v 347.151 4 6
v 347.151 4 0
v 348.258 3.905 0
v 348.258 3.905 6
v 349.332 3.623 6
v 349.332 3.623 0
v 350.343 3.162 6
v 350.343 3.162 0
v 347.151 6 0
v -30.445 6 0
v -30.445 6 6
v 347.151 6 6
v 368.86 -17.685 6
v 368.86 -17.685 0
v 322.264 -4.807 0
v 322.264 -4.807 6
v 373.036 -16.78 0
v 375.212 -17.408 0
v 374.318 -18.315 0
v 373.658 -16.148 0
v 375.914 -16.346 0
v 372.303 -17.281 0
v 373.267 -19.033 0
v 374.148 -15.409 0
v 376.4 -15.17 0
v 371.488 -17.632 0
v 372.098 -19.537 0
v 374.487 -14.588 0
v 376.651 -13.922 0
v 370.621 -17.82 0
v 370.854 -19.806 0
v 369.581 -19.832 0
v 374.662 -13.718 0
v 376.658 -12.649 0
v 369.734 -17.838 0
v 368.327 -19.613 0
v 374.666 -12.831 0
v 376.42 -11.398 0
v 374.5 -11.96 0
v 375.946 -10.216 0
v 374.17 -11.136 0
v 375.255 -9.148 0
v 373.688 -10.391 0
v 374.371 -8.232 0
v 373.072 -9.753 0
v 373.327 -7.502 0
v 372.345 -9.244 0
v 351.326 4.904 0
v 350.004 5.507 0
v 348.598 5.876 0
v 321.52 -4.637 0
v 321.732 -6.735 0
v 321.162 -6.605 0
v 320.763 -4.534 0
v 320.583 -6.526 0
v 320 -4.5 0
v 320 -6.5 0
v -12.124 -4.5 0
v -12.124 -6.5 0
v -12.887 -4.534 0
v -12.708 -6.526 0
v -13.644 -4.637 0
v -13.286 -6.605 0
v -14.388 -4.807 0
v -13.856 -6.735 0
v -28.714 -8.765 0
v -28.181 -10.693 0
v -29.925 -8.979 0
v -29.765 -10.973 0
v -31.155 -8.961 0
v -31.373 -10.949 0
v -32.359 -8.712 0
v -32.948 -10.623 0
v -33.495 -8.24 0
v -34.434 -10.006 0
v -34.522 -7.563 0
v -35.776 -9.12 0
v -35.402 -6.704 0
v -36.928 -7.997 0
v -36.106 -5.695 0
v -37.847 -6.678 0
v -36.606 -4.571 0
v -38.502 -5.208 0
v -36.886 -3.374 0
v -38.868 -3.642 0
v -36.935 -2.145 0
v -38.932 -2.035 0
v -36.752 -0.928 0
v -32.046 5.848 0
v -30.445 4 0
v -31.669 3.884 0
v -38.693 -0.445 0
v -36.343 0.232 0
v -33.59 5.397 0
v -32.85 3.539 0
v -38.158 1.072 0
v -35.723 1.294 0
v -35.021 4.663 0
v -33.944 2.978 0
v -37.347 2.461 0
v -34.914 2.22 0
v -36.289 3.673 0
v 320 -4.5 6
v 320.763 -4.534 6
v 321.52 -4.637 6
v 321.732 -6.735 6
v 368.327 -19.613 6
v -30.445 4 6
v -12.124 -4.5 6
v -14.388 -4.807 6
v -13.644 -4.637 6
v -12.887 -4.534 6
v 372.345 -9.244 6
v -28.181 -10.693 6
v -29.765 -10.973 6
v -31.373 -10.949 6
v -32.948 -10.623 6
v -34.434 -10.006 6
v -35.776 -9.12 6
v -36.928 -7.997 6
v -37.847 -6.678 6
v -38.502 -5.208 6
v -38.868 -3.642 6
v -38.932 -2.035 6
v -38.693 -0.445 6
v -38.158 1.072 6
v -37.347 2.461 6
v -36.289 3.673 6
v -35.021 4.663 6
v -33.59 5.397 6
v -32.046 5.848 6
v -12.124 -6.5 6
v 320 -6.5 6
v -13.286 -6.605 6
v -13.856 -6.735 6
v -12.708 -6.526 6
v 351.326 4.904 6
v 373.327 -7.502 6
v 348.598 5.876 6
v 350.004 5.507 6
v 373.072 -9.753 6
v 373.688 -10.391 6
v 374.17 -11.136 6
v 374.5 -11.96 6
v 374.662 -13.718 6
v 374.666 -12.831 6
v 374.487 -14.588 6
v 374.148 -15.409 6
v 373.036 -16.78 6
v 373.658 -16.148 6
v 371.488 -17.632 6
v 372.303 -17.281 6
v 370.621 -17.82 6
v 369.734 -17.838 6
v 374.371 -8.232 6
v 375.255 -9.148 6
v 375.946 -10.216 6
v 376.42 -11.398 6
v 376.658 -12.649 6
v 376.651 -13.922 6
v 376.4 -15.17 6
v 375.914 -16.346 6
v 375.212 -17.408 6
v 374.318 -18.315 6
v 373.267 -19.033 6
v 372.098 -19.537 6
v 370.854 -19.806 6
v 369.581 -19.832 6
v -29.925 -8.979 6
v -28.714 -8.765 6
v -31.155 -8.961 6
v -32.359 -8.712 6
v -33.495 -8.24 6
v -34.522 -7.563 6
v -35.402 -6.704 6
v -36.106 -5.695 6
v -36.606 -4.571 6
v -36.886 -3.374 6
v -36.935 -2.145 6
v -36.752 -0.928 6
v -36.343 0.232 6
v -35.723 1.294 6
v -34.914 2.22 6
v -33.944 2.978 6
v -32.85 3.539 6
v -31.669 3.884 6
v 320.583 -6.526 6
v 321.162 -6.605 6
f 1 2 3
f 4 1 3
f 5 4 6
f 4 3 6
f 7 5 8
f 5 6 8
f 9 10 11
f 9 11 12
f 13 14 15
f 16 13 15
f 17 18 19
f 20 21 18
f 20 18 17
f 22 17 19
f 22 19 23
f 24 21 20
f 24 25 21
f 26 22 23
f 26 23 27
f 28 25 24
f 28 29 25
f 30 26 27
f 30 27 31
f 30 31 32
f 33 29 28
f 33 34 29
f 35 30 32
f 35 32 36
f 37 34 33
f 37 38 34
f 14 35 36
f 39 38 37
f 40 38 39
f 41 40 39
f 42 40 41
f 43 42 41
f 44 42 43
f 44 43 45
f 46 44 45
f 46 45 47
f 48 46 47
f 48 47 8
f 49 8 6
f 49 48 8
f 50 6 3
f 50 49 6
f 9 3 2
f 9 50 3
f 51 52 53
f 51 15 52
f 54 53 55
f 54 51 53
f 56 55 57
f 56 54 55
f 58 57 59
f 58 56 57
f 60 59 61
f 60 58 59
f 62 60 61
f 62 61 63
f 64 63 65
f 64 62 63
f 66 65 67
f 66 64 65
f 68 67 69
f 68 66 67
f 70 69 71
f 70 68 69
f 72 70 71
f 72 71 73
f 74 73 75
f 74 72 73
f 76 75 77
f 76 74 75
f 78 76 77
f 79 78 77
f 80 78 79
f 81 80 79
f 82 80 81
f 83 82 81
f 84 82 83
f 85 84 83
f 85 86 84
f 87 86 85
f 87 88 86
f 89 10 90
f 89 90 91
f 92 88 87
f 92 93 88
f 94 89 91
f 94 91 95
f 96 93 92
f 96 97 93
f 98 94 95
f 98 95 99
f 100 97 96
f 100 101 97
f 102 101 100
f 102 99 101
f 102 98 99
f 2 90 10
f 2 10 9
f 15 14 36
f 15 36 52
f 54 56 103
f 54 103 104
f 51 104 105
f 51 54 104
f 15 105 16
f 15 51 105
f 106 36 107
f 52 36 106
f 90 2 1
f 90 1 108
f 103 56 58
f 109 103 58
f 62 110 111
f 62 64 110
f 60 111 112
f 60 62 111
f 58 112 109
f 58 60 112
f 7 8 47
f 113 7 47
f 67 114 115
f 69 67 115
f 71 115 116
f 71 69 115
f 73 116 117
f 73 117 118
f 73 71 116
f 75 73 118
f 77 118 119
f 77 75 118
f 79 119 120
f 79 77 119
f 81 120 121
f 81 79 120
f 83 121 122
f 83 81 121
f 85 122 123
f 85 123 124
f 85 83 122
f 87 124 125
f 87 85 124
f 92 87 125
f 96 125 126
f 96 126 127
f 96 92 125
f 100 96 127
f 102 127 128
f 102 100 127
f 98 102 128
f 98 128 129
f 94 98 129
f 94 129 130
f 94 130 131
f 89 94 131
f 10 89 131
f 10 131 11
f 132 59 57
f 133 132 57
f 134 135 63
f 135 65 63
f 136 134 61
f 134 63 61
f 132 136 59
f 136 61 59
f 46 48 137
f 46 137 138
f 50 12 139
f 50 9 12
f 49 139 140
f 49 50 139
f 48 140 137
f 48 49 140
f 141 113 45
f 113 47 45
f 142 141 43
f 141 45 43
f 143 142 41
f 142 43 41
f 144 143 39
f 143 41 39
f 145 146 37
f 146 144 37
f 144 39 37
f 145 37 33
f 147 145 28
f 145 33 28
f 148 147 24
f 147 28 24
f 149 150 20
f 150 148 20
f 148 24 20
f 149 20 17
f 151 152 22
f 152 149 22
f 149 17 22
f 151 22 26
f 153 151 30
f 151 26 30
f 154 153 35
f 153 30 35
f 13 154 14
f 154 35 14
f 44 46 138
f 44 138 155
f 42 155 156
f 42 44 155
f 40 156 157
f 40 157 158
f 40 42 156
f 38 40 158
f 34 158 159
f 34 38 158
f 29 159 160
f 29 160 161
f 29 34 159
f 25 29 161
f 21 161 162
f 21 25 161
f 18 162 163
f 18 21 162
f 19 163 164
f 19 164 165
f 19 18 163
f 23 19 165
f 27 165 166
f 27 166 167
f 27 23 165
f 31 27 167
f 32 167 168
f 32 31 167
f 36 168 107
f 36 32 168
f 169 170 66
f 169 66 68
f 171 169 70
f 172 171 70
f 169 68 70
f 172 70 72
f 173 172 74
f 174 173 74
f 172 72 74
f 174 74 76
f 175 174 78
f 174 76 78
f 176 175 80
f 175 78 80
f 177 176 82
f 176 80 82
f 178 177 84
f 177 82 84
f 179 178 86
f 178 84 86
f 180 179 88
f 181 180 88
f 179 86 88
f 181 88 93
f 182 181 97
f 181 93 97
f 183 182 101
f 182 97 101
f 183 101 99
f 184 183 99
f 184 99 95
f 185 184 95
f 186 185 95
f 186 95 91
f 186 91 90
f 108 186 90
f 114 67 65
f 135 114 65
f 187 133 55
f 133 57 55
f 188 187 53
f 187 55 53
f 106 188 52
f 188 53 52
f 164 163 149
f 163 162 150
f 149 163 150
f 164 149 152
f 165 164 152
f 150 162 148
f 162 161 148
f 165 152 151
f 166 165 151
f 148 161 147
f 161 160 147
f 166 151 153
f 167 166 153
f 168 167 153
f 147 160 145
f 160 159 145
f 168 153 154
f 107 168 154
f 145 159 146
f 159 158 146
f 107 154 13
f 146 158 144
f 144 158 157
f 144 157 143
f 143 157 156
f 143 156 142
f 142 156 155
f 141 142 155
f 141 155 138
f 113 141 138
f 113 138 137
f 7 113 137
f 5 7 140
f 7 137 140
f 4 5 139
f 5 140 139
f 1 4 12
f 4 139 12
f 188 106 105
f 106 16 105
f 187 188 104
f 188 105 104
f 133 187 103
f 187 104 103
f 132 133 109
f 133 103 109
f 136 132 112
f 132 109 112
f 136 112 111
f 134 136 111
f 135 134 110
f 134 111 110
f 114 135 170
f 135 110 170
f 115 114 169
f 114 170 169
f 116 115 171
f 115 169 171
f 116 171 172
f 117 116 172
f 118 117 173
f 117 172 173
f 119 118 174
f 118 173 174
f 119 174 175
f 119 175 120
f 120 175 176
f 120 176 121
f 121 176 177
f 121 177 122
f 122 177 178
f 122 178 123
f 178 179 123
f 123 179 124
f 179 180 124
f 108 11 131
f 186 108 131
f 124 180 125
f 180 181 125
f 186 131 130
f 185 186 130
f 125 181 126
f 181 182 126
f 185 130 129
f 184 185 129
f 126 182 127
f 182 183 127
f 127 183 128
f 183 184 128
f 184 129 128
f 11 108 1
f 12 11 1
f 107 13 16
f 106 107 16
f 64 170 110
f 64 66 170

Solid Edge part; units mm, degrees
sketch "Sketch1" plane through (0, 0, 0) normal (0, 0, 1) x (1, 0, 0)
  line L0 (-30.4449, 6) -> (347.1507, 6)
  arc A0 (347.1507, 6) -> (351.3257, 4.904) centre (347.1507, -2.5) cw
  line L1 (351.3257, 4.904) -> (373.3271, -7.5022)
  arc A1 (373.3271, -7.5022) -> (368.3271, -19.6127) centre (370.0853, -13.2512) cw
  line L2 (368.3271, -19.6127) -> (321.7315, -6.7349)
  line L3 (-12.1244, -6.5) -> (320, -6.5)
  line L4 (-28.1811, -10.693) -> (-13.8555, -6.7348)
  arc A2 (-28.1811, -10.693) -> (-30.4449, 6) centre (-30.4449, -2.5) cw
  arc A3 (320, -6.5) -> (321.7315, -6.7349) centre (320, -13) cw
  arc A4 (-13.8555, -6.7348) -> (-12.1244, -6.5) centre (-12.1244, -13) cw
  line L5 (347.1507, 4) -> (-30.4449, 4)
  line L6 (-28.7137, -8.7652) -> (-14.3881, -4.807)
  line L7 (320, -4.5) -> (-12.1244, -4.5)
  line L8 (368.8599, -17.6849) -> (322.2643, -4.8071)
  line L9 (350.3433, 3.1619) -> (372.3447, -9.2443)
  arc A5 (-28.7137, -8.7652) -> (-30.4449, 4) centre (-30.4449, -2.5) cw
  arc A6 (-14.3881, -4.807) -> (-12.1244, -4.5) centre (-12.1244, -13) cw
  arc A7 (320, -4.5) -> (322.2643, -4.8071) centre (320, -13) cw
  arc A8 (368.8599, -17.685) -> (372.3447, -9.2443) centre (370.0853, -13.2512) ccw
  arc A9 (347.1507, 4) -> (350.3433, 3.1619) centre (347.1507, -2.5) cw
extrude "Protrusion1" add sketch "Sketch1" along normal blind 6
properties material "PVC"
